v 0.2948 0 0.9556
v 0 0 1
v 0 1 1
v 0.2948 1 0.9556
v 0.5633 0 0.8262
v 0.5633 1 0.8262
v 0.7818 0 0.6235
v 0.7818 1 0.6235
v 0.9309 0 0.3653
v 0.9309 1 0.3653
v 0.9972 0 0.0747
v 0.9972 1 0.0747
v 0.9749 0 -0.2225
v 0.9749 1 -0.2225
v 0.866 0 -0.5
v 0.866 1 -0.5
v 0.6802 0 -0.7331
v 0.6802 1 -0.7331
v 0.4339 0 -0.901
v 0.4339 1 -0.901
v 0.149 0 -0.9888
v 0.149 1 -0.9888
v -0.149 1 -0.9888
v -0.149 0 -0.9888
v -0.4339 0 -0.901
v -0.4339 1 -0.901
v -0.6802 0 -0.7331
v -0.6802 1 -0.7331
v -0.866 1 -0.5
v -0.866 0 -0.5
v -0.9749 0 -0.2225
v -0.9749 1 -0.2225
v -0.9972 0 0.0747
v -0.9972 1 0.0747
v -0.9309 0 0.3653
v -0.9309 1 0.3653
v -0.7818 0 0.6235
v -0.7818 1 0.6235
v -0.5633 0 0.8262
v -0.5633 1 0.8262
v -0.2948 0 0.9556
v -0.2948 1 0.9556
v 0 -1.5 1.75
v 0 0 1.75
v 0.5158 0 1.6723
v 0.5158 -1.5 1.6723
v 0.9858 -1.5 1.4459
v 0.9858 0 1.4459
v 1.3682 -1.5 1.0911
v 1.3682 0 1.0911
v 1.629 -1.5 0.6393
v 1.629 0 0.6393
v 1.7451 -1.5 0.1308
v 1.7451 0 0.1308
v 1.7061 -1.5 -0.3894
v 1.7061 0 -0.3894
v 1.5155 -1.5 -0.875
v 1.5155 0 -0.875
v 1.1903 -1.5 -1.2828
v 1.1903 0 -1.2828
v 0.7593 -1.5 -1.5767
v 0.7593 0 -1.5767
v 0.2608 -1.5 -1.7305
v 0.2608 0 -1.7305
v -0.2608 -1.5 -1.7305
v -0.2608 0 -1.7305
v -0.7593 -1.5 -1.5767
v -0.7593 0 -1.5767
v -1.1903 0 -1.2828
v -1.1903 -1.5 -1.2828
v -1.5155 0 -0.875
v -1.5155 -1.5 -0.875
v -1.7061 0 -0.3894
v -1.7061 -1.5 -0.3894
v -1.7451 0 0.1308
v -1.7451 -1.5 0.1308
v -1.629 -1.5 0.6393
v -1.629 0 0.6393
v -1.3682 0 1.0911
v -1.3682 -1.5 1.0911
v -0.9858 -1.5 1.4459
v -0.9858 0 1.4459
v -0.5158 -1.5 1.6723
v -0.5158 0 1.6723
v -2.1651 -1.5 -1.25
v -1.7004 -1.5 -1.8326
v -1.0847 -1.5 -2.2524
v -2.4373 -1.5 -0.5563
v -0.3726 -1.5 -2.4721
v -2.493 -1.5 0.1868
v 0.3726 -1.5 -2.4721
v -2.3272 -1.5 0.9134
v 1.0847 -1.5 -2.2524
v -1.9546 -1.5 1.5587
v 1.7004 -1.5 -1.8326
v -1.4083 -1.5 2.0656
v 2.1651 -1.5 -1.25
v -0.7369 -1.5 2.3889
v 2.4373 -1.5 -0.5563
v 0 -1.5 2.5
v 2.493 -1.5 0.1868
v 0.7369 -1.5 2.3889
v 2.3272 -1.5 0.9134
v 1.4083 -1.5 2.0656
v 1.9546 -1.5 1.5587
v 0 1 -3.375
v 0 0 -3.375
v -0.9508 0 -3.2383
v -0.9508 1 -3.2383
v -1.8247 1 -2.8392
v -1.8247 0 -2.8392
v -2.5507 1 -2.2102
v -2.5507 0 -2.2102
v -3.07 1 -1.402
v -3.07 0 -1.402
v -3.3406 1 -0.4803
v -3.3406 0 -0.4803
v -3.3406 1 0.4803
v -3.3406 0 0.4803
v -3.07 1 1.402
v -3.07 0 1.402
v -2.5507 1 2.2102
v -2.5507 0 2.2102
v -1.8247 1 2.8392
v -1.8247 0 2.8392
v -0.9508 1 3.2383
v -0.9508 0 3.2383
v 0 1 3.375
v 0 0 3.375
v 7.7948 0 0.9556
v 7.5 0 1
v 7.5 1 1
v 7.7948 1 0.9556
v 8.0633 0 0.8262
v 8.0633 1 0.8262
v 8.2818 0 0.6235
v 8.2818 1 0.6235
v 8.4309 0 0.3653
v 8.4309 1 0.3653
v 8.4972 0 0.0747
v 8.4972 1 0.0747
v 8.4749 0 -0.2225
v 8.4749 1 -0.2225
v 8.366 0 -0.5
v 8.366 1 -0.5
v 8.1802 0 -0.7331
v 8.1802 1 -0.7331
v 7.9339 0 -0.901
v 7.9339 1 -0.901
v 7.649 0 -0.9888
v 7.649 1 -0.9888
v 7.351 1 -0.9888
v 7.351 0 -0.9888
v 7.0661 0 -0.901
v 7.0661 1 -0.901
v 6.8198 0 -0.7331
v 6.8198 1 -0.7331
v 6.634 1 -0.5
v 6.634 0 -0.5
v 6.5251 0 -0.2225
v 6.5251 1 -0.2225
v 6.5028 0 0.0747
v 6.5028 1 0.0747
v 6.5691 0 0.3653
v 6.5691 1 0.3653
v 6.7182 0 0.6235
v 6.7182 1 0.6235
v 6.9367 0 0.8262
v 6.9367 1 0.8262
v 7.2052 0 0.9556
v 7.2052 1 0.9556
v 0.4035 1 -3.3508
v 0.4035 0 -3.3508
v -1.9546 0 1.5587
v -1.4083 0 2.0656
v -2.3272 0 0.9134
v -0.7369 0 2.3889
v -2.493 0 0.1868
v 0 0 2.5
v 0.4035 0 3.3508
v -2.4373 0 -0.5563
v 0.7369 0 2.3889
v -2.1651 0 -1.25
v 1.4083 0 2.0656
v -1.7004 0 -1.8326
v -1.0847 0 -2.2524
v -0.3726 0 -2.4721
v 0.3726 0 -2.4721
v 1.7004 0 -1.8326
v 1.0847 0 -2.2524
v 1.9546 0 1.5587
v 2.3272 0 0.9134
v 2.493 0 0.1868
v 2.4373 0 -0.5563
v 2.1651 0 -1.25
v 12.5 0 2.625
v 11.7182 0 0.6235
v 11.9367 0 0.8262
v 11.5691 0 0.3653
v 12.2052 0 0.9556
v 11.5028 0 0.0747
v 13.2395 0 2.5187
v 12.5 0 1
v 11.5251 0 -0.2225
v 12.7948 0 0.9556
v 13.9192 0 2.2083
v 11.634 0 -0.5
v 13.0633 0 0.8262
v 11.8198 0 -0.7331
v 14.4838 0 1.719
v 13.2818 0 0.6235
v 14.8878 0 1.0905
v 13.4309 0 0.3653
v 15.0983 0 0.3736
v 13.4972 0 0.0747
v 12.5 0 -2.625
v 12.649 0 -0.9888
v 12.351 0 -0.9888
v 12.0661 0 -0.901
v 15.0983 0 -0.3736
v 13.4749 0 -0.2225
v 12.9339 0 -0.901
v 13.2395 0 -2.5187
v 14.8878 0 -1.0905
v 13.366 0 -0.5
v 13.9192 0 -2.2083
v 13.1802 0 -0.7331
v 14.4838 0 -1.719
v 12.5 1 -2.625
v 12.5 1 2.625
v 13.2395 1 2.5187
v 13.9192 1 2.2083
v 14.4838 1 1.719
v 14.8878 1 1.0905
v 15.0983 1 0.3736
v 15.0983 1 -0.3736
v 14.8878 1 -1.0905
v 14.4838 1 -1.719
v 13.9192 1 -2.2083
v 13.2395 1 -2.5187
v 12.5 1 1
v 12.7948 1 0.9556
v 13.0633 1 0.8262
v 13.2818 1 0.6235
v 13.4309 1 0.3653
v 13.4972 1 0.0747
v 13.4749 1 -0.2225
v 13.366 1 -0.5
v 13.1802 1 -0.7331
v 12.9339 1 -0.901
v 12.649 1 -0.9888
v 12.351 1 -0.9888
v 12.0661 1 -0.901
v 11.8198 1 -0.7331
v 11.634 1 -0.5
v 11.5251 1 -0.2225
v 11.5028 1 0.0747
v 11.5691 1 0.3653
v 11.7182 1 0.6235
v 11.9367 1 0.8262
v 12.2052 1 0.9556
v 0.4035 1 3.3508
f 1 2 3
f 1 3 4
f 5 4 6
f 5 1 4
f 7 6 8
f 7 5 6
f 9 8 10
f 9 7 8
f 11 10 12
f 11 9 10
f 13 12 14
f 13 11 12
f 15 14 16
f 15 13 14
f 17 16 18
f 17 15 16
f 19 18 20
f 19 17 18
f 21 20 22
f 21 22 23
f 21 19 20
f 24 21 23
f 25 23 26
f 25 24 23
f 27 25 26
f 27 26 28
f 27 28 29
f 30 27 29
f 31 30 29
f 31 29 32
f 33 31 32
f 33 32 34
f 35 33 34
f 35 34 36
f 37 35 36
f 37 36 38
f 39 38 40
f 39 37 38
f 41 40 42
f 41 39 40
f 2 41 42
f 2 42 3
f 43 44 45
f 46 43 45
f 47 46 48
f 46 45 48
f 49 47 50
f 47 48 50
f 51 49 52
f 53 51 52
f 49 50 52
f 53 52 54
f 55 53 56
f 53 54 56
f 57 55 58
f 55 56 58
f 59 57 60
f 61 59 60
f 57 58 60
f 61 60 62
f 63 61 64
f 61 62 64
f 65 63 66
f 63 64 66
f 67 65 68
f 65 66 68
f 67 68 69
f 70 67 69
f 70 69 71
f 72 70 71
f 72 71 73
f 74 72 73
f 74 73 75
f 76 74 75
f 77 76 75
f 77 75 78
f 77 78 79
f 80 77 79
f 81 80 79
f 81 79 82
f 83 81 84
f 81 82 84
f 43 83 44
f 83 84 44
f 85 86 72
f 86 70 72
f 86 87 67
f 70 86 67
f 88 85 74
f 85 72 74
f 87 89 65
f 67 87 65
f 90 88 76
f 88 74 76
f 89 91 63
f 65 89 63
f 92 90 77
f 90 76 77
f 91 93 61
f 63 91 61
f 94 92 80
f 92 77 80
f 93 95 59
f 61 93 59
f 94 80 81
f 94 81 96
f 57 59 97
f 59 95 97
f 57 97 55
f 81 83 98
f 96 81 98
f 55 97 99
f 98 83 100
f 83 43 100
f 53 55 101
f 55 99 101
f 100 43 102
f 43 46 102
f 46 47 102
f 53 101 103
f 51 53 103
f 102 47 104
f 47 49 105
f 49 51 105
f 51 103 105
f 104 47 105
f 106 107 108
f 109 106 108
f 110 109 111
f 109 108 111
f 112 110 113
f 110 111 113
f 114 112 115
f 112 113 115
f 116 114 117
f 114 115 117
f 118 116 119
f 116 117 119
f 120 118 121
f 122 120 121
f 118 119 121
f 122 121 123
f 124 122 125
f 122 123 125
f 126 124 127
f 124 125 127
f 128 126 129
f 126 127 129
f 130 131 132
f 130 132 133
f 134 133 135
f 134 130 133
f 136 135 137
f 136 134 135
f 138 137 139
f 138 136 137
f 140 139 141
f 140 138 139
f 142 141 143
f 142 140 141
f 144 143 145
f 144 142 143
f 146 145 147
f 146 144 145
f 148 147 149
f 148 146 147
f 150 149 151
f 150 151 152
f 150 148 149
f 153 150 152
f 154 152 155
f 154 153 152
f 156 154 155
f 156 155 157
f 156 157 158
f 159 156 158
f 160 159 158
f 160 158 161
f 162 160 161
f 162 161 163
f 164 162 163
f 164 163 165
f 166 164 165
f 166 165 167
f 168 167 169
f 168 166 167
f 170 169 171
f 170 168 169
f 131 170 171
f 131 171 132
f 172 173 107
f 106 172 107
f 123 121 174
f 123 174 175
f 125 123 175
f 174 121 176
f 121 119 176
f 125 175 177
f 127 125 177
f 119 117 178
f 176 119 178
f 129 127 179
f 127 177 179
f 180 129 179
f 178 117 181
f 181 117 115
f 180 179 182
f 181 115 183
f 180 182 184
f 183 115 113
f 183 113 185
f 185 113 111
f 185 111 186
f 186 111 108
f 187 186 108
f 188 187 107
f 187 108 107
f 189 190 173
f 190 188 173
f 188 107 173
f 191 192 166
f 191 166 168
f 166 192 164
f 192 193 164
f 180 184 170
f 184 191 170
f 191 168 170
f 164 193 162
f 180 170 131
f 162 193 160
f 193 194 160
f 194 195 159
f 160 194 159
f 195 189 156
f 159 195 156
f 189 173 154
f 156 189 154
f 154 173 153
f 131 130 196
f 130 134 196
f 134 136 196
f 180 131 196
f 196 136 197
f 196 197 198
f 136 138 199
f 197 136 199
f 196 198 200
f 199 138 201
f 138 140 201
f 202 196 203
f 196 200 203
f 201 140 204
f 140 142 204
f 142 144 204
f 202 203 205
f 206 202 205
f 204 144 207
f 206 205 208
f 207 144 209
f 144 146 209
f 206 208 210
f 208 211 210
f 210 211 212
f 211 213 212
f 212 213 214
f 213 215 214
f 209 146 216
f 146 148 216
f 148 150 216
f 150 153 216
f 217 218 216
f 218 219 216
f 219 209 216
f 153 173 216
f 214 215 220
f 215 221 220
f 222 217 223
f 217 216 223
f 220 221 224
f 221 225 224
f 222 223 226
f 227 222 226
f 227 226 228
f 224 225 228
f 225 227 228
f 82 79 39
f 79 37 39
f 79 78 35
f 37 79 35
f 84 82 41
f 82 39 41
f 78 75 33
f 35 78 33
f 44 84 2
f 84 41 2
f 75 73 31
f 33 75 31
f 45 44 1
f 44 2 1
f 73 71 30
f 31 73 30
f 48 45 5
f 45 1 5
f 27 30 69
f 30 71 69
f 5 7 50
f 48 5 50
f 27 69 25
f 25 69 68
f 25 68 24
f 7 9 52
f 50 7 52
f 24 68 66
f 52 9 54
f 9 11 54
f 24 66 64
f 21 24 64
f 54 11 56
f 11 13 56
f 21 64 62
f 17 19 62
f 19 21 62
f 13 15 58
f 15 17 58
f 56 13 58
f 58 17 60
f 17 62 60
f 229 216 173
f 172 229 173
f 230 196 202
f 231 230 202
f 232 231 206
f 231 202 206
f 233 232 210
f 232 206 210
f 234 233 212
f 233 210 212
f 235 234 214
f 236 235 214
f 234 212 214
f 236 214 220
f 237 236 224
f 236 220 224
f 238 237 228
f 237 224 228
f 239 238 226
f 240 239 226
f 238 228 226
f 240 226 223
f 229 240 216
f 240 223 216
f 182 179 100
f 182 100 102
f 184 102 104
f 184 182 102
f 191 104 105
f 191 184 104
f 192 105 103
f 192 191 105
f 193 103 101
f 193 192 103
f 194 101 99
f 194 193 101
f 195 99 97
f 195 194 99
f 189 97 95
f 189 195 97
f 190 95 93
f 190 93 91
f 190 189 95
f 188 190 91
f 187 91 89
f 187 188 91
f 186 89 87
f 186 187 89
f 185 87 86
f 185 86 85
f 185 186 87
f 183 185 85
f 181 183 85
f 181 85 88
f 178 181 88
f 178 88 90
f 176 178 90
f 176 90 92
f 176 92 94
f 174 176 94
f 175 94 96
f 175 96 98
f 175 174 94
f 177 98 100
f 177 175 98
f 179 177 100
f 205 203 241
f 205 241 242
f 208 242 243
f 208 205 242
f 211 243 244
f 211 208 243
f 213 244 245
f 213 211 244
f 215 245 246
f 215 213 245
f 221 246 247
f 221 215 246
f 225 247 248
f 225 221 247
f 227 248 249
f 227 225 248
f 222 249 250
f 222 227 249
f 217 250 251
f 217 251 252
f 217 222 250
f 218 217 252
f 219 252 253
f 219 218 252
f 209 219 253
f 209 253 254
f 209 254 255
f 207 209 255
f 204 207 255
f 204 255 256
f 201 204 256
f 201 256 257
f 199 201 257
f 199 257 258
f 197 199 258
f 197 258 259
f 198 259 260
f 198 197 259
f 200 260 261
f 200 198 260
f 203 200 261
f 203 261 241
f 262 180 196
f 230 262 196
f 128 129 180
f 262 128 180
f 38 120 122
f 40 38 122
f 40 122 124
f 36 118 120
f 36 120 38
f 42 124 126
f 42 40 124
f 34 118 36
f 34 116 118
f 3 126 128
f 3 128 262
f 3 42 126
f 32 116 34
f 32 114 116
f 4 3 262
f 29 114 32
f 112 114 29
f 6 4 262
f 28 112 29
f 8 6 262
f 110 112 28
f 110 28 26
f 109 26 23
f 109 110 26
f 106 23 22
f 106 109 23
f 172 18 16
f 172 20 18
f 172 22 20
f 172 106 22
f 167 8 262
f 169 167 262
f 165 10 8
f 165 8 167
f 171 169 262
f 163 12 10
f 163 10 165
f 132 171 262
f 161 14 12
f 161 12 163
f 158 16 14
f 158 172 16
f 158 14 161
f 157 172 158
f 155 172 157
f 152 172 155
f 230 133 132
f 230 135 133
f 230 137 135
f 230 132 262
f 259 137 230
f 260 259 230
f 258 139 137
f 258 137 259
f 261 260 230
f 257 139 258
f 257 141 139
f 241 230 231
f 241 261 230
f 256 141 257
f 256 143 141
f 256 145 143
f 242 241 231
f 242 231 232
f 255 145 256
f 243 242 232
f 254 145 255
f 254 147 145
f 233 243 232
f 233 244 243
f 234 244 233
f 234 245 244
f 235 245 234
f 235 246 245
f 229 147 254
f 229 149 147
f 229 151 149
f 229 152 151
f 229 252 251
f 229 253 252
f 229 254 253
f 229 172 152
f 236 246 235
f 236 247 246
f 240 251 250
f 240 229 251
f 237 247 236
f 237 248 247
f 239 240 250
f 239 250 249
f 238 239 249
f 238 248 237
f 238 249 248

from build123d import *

# Parameters (mm, degrees)
SKETCH_2_R      = 1
EXTRUDE_1_DEPTH = 1
SKETCH_3_R      = 2.5
SKETCH_3_R_2    = 1.75
EXTRUDE_2_DEPTH = 1.5


with BuildPart() as part:
    # 草图2 → 凸台-拉伸1 (new body)
    with BuildSketch(Plane(origin=(0, 0, 0), x_dir=(1, 0, 0), z_dir=(0, 1, 0))):
        with BuildLine():
            Line((0.40354723, 3.350787166), (0, 3.375))
            ThreePointArc((0, 3.375), (-3.375, 0), (0, -3.375))
            Line((0, -3.375), (0.40354723, -3.350787166))
            Line((0.40354723, -3.350787166), (12.5, -2.625))
            ThreePointArc((12.5, -2.625), (15.125, 0), (12.5, 2.625))
            Line((12.5, 2.625), (0.40354723, 3.350787166))
        make_face()
        with Locations(Location((0, 0, 0), (0, 0, 270))):
            Circle(SKETCH_2_R, mode=Mode.SUBTRACT)
        with Locations(Location((7.5, 0, 0), (0, 0, 270))):
            Circle(SKETCH_2_R, mode=Mode.SUBTRACT)
        with Locations(Location((12.5, 0, 0), (0, 0, 270))):
            Circle(SKETCH_2_R, mode=Mode.SUBTRACT)
    extrude(amount=EXTRUDE_1_DEPTH)

    # 草图3 → 凸台-拉伸2 (add)
    with BuildSketch(Plane(origin=(0, 0, 0), x_dir=(1, 0, 0), z_dir=(0, 1, 0))):
        with Locations(Location((0, 0, 0), (0, 0, 270))):
            Circle(SKETCH_3_R)
        with Locations(Location((0, 0, 0), (0, 0, 270))):
            Circle(SKETCH_3_R_2, mode=Mode.SUBTRACT)
    extrude(amount=-EXTRUDE_2_DEPTH)


solid = part.part
